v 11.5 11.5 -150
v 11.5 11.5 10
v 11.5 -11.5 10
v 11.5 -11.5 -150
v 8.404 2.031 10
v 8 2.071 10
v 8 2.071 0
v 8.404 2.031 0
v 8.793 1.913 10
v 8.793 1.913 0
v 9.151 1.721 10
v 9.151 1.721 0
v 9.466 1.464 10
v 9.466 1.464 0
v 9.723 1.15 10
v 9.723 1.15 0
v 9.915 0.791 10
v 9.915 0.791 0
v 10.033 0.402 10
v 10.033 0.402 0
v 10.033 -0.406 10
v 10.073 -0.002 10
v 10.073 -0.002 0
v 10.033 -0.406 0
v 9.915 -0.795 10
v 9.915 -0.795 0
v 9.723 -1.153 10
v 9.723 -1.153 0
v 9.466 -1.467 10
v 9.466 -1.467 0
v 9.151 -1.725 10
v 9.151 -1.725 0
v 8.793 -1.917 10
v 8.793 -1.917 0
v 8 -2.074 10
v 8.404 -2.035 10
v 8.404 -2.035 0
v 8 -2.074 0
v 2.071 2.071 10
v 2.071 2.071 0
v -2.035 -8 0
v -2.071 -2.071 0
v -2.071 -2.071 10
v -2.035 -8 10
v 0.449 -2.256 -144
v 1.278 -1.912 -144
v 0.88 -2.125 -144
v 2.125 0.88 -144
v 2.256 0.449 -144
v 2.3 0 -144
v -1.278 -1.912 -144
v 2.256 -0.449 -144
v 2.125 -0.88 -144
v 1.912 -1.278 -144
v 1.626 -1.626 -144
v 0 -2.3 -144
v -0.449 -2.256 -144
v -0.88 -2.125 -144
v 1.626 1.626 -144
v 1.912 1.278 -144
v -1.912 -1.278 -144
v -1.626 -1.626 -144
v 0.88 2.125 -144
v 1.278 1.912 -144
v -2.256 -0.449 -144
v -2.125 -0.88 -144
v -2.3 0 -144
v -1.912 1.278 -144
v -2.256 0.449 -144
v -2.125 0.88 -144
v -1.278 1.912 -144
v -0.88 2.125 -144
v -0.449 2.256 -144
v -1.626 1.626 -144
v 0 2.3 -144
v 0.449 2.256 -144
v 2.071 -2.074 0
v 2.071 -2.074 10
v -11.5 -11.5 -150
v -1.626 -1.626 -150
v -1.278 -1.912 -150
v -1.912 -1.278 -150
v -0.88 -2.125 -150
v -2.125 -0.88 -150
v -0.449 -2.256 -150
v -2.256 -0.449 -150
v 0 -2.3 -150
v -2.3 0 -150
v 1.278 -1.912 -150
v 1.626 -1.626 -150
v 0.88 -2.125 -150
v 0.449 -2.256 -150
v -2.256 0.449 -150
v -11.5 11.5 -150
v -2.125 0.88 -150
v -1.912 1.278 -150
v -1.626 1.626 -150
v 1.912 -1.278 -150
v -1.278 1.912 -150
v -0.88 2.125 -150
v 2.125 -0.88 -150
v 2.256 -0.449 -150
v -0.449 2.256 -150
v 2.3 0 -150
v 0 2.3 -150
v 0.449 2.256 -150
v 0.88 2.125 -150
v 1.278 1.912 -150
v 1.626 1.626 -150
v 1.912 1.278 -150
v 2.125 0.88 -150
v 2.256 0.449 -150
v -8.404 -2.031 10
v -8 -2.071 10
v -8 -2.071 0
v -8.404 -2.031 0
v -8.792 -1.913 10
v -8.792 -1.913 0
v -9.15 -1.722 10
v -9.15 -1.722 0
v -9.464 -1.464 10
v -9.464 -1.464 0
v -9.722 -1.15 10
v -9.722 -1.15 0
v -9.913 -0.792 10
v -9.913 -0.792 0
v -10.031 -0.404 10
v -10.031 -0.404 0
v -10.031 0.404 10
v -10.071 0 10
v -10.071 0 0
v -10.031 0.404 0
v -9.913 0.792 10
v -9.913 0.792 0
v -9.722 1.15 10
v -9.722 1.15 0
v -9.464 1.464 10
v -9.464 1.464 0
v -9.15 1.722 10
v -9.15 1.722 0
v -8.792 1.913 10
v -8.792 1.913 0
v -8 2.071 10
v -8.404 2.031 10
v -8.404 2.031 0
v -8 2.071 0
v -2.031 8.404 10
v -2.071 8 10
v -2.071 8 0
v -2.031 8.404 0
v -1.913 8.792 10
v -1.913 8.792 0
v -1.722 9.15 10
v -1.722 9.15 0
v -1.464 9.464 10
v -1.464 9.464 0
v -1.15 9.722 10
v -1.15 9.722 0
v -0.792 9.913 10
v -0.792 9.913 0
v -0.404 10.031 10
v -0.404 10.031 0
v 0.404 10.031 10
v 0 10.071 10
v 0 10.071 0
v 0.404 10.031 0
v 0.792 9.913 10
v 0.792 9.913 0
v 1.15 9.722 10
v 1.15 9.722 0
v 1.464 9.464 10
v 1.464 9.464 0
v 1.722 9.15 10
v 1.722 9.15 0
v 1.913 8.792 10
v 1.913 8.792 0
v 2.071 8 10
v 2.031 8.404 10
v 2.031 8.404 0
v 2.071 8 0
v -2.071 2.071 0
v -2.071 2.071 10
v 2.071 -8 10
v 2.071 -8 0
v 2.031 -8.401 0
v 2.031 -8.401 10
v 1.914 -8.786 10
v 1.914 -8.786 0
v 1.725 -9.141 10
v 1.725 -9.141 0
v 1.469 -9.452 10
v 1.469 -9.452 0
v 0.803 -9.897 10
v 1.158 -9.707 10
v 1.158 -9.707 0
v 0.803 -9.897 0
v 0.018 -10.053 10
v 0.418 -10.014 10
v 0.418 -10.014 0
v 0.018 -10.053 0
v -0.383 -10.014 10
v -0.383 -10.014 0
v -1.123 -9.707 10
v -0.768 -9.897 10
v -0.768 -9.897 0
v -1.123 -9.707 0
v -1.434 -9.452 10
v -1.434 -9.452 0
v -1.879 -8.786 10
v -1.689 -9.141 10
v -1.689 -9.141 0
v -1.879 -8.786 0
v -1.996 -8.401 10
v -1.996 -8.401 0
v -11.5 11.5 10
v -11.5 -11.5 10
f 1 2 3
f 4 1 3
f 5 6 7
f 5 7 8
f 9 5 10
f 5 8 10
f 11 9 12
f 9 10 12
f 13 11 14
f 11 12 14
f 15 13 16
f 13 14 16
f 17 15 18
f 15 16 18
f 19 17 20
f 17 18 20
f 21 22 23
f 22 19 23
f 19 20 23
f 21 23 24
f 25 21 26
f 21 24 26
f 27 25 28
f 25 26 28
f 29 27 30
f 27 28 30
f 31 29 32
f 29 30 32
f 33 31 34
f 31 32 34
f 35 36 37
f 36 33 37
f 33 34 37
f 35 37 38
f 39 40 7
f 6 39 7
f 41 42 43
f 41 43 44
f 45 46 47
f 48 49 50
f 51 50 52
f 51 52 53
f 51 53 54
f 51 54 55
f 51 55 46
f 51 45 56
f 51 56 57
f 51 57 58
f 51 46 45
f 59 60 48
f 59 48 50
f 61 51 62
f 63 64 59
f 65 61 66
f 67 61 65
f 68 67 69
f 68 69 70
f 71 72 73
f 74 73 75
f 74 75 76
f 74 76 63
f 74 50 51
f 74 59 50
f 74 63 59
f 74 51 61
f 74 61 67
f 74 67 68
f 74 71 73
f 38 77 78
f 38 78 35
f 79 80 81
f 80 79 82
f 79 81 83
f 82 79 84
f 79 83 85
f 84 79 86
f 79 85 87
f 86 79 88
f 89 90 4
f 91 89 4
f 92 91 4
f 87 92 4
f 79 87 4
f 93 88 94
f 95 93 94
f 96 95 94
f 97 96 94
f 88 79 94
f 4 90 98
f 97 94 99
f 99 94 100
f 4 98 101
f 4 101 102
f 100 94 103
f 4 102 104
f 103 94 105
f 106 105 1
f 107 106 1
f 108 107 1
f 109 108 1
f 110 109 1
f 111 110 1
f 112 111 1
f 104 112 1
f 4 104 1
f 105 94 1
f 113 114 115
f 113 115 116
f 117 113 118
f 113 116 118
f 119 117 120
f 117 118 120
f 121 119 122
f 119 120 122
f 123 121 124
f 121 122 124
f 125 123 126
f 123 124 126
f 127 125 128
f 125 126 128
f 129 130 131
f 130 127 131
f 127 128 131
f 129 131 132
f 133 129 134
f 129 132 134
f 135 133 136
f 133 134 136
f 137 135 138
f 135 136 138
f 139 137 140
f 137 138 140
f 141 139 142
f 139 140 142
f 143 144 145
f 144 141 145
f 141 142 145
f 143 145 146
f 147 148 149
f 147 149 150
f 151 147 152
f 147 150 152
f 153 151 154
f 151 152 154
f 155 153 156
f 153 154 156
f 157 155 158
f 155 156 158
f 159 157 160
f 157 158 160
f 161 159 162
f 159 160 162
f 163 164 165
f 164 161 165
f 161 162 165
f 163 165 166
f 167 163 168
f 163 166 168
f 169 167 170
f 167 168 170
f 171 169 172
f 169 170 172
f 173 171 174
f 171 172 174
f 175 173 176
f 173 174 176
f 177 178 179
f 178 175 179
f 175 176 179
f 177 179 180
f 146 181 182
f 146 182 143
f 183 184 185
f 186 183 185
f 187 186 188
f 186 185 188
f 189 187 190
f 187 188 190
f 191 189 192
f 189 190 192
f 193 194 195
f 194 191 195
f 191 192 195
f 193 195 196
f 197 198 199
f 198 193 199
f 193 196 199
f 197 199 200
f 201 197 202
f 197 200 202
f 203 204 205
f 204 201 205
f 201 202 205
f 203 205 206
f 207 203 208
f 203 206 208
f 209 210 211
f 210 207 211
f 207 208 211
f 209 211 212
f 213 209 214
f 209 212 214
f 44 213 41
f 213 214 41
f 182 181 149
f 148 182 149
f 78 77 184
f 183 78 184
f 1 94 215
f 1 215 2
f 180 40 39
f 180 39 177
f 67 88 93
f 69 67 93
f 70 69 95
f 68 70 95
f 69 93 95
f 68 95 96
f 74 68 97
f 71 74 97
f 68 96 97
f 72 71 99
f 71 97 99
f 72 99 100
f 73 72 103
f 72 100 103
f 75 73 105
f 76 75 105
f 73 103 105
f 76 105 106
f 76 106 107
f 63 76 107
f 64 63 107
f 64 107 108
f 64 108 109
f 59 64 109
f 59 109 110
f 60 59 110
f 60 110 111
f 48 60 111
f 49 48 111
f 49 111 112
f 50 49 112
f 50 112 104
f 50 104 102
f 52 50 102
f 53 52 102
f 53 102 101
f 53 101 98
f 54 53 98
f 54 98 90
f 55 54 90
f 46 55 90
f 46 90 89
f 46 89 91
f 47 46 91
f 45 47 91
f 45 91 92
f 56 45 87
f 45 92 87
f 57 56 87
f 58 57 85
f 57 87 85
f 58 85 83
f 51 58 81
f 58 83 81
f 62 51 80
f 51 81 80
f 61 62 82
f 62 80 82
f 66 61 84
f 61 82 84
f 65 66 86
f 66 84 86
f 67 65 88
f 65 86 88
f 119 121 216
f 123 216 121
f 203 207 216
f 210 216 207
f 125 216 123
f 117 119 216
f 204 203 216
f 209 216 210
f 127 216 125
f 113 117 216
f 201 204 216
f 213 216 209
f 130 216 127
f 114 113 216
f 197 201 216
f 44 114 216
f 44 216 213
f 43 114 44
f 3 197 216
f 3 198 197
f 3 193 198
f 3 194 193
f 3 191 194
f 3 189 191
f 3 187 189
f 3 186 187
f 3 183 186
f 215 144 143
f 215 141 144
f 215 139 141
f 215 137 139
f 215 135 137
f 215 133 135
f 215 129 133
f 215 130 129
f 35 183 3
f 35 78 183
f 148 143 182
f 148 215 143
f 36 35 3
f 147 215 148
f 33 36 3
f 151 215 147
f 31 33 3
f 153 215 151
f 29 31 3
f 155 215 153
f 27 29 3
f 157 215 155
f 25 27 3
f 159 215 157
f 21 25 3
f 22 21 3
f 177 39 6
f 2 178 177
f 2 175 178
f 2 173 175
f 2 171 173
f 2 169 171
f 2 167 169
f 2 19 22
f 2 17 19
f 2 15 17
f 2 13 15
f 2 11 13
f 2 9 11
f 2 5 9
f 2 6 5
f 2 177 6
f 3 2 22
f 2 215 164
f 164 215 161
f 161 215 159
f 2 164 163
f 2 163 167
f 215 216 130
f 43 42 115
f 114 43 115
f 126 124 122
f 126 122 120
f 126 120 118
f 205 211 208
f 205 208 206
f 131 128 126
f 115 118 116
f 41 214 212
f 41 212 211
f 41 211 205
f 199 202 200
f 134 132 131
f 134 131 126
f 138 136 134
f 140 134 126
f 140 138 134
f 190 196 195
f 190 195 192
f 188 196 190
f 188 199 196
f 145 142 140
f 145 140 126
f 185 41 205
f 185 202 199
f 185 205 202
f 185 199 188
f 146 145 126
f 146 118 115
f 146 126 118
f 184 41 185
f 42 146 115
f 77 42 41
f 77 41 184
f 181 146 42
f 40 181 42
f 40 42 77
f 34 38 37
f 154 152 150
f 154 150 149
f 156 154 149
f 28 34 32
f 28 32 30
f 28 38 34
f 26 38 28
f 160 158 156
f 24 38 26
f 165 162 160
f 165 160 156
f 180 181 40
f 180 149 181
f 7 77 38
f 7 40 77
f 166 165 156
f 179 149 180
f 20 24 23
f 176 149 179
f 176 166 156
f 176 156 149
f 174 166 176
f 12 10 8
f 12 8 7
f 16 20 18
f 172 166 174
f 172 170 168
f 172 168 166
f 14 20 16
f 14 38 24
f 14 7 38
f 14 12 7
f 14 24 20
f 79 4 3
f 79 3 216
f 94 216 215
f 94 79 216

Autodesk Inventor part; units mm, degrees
ref_plane "YZ Plane" through (0, 0, 0) normal (1, 0, 0) x (0, 1, 0)
ref_plane "XZ Plane" through (0, 0, 0) normal (0, 1, 0) x (-1, 0, 0)
ref_plane "XY Plane" through (0, 0, 0) normal (0, 0, 1) x (1, 0, 0)
sketch "Sketch1" plane through (0, 0, 0) normal (0, 0, 1) x (1, 0, 0)
  line L0 (-8, -2) -> (-2, -2)
  line L1 (-2, -2) -> (-8, -2)
  line L2 (-2, -2) -> (-2, -7.923)
  line L3 (2, -8) -> (2, -2.0038)
  line L4 (2, -2.0038) -> (2, -8)
  arc A0 (8, -2.0038) -> (10.0019, 0) centre (8, -0.0019) ccw
  line L5 (2, -2.0038) -> (8, -2.0038)
  line L6 (2, 2) -> (2, 8)
  line L7 (8, 2) -> (2, 2)
  line L8 (2, 2) -> (8, 2)
  line L9 (2, 2) -> (2, 8)
  line L10 (-2, 8) -> (-2, 2)
  line L11 (-2, 2) -> (-2, 8)
  arc A1 (-8, 2) -> (-10, 0) centre (-8, 0) ccw
  line L12 (-2, 2) -> (-8, 2)
  arc A2 (-8, 2) -> (-8, -2) centre (-8, 0) ccw
  arc A3 (-2, -8) -> (0, -10) centre (0, -8) ccw
  arc A4 (-2, -8) -> (2, -8) centre (0, -8) ccw
  arc A5 (8, -2.0038) -> (8, 2) centre (8, -0.0019) ccw
  arc A6 (2, 8) -> (-2, 8) centre (0, 8) ccw
  circle A7 centre (0, 0) radius 11.5
  line L13 (-2, 2) -> (-2.3536, 2.3536)
  line L14 (-2, 2) -> (-1.5, 2) construction
  line L15 (-2.3536, 2.3536) -> (-8, 2.3536)
  line L16 (-8, 2.3536) -> (-8, 2)
  line L17 (-2, -2) -> (-2.3536, -2.3536)
  line L18 (-2.3536, -2.3536) -> (-8, -2.3536)
  line L19 (-8, -2.3536) -> (-8, -2)
  line L20 (-2.3536, -2.3536) -> (-2.3536, -8)
  line L21 (-2.3536, -8) -> (-2, -8)
  line L22 (2, -2.0038) -> (2.3536, -2.3573)
  line L23 (2.3536, -2.3573) -> (2.3536, -8)
  line L24 (2.3536, -8) -> (2, -8)
  line L25 (-2, -7.923) -> (-2, -8)
  line L26 (2.3536, -2.3573) -> (8, -2.3573)
  line L27 (8, -2.3573) -> (8, -2.0038)
  line L28 (2, 2) -> (2.3536, 2.3536)
  line L29 (2.3536, 2.3536) -> (8, 2.3536)
  line L30 (8, 2.3536) -> (8, 2)
  line L31 (2.3536, 2.3536) -> (2.3536, 8)
  line L32 (2.3536, 8) -> (2, 8)
  line L33 (-2.3536, 2.3536) -> (-2.3536, 8)
  line L34 (-2.3536, 8) -> (-2, 8)
  arc A8 (2.3536, 8) -> (-2.3536, 8) centre (0, 8) ccw
  arc A9 (8, -2.3573) -> (8, 2.3536) centre (8, -0.0019) ccw
  arc A10 (-2.3536, -8) -> (2.3536, -8) centre (0, -8) ccw
  arc A11 (-8, 2.3536) -> (-8, -2.3536) centre (-8, 0) ccw
  line L35 (-2, 2) -> (-2.0707, 2.0707)
  line L36 (-2.0707, 2.0707) -> (-8, 2.0707)
  line L37 (-2.0707, 2.0707) -> (-2.0707, 8)
  line L38 (-2, -2) -> (-2.0707, -2.0707)
  line L39 (-2.0707, -2.0707) -> (-8, -2.0707)
  line L40 (-2.0707, -2.0707) -> (-2.0354, -8)
  line L41 (2, -2.0038) -> (2.0707, -2.0745)
  line L42 (2.0707, -2.0745) -> (2.0707, -8)
  line L43 (2.0707, -2.0745) -> (8, -2.0745)
  line L44 (2, 2) -> (2.0707, 2.0707)
  line L45 (2.0707, 2.0707) -> (8, 2.0707)
  line L46 (2.0707, 2.0707) -> (2.0707, 8)
  arc A12 (2.0707, 8) -> (-2.0707, 8) centre (0, 8) ccw
  arc A13 (-8, 2.0707) -> (-8, -2.0707) centre (-8, 0) ccw
  arc A14 (-2.0354, -8) -> (2.0707, -8) centre (0.0177, -8) ccw
  arc A15 (8, -2.0745) -> (8, 2.0707) centre (8, -0.0019) ccw
  line L47 (-11.5, 11.5) -> (11.5, 11.5)
  line L48 (11.5, 11.5) -> (11.5, -11.5)
  line L49 (11.5, -11.5) -> (-11.5, -11.5)
  line L50 (-11.5, -11.5) -> (-11.5, 11.5)
  point P0 (-11.5, 0)
  point P1 (0, -11.5)
  point P2 (0, 11.5)
  point P3 (11.5, 0)
  dimension "d1" = 23
  dimension "d2" = 0.5
  dimension "d3" = 135
  dimension "d4" = 0.5
  dimension "d6" = 5.6464
  dimension "d7" = 5.6464
  dimension "d8" = 0.5
  dimension "d9" = 0.5
  dimension "d10" = 0.1
  dimension "d11" = 0.1
  dimension "d13" = 0.1
  dimension "d14" = 0.1
  dimension "d22" = 23
  dimension "d23" = 23
extrude "Extrusion1" add sketch "Sketch1" along normal blind 10 contours L39 L17 L18 L19 | L19 A11 L16 A13 | L40 L21 L20 L17 | L16 L15 L13 L36 | A14 L24 A10 L21 | L13 L33 L34 L37 | L42 L22 L23 L24 | L34 A8 L32 A12 | L43 L27 L26 L22 | L32 L31 L28 L46 | A15 L30 A9 L27 | L28 L29 L30 L45 | A7 | L48 L49 A7 | A7 L47 L48 | A7 L50 L47 | L49 L50 A7
extrude "Extrusion2" add sketch "Sketch1" against normal blind 150 contours A2 A1 L12 L10 A6 L6 L7 A5 A0 L5 L3 A4 A3 L25 L2 L0 | L19 A13 L16 A1 A2 | L0 L17 L39 L19 | L2 L25 L21 L40 L17 | L39 L17 L18 L19 | L19 A11 L16 A13 | L40 L21 L20 L17 | L16 L36 L13 L12 | L16 L15 L13 L36 | A3 A4 L24 A14 L21 | A14 L24 A10 L21 | L13 L37 L34 L10 | L13 L33 L34 L37 | L42 L22 L23 L24 | L24 L3 L22 L42 | L34 A12 L32 A6 | L34 A8 L32 A12 | L43 L27 L26 L22 | L22 L5 L27 L43 | L32 L46 L28 L6 | L32 L31 L28 L46 | A15 L30 A9 L27 | L27 A0 A5 L30 A15 | L28 L45 L30 L7 | L28 L29 L30 L45 | A7 | L48 L49 A7 | A7 L47 L48 | A7 L50 L47 | L49 L50 A7
sketch "Sketch2" plane through (0, 0, -150) normal (0, 0, -1) x (-1, 0, 0)
  circle A0 centre (0, 0) radius 2.3
  dimension "d19" = 4.6
extrude "Extrusion3" cut sketch "Sketch2" against normal blind 6
properties part number "Tussen stuk V1.1" material "ABS Plastic"
